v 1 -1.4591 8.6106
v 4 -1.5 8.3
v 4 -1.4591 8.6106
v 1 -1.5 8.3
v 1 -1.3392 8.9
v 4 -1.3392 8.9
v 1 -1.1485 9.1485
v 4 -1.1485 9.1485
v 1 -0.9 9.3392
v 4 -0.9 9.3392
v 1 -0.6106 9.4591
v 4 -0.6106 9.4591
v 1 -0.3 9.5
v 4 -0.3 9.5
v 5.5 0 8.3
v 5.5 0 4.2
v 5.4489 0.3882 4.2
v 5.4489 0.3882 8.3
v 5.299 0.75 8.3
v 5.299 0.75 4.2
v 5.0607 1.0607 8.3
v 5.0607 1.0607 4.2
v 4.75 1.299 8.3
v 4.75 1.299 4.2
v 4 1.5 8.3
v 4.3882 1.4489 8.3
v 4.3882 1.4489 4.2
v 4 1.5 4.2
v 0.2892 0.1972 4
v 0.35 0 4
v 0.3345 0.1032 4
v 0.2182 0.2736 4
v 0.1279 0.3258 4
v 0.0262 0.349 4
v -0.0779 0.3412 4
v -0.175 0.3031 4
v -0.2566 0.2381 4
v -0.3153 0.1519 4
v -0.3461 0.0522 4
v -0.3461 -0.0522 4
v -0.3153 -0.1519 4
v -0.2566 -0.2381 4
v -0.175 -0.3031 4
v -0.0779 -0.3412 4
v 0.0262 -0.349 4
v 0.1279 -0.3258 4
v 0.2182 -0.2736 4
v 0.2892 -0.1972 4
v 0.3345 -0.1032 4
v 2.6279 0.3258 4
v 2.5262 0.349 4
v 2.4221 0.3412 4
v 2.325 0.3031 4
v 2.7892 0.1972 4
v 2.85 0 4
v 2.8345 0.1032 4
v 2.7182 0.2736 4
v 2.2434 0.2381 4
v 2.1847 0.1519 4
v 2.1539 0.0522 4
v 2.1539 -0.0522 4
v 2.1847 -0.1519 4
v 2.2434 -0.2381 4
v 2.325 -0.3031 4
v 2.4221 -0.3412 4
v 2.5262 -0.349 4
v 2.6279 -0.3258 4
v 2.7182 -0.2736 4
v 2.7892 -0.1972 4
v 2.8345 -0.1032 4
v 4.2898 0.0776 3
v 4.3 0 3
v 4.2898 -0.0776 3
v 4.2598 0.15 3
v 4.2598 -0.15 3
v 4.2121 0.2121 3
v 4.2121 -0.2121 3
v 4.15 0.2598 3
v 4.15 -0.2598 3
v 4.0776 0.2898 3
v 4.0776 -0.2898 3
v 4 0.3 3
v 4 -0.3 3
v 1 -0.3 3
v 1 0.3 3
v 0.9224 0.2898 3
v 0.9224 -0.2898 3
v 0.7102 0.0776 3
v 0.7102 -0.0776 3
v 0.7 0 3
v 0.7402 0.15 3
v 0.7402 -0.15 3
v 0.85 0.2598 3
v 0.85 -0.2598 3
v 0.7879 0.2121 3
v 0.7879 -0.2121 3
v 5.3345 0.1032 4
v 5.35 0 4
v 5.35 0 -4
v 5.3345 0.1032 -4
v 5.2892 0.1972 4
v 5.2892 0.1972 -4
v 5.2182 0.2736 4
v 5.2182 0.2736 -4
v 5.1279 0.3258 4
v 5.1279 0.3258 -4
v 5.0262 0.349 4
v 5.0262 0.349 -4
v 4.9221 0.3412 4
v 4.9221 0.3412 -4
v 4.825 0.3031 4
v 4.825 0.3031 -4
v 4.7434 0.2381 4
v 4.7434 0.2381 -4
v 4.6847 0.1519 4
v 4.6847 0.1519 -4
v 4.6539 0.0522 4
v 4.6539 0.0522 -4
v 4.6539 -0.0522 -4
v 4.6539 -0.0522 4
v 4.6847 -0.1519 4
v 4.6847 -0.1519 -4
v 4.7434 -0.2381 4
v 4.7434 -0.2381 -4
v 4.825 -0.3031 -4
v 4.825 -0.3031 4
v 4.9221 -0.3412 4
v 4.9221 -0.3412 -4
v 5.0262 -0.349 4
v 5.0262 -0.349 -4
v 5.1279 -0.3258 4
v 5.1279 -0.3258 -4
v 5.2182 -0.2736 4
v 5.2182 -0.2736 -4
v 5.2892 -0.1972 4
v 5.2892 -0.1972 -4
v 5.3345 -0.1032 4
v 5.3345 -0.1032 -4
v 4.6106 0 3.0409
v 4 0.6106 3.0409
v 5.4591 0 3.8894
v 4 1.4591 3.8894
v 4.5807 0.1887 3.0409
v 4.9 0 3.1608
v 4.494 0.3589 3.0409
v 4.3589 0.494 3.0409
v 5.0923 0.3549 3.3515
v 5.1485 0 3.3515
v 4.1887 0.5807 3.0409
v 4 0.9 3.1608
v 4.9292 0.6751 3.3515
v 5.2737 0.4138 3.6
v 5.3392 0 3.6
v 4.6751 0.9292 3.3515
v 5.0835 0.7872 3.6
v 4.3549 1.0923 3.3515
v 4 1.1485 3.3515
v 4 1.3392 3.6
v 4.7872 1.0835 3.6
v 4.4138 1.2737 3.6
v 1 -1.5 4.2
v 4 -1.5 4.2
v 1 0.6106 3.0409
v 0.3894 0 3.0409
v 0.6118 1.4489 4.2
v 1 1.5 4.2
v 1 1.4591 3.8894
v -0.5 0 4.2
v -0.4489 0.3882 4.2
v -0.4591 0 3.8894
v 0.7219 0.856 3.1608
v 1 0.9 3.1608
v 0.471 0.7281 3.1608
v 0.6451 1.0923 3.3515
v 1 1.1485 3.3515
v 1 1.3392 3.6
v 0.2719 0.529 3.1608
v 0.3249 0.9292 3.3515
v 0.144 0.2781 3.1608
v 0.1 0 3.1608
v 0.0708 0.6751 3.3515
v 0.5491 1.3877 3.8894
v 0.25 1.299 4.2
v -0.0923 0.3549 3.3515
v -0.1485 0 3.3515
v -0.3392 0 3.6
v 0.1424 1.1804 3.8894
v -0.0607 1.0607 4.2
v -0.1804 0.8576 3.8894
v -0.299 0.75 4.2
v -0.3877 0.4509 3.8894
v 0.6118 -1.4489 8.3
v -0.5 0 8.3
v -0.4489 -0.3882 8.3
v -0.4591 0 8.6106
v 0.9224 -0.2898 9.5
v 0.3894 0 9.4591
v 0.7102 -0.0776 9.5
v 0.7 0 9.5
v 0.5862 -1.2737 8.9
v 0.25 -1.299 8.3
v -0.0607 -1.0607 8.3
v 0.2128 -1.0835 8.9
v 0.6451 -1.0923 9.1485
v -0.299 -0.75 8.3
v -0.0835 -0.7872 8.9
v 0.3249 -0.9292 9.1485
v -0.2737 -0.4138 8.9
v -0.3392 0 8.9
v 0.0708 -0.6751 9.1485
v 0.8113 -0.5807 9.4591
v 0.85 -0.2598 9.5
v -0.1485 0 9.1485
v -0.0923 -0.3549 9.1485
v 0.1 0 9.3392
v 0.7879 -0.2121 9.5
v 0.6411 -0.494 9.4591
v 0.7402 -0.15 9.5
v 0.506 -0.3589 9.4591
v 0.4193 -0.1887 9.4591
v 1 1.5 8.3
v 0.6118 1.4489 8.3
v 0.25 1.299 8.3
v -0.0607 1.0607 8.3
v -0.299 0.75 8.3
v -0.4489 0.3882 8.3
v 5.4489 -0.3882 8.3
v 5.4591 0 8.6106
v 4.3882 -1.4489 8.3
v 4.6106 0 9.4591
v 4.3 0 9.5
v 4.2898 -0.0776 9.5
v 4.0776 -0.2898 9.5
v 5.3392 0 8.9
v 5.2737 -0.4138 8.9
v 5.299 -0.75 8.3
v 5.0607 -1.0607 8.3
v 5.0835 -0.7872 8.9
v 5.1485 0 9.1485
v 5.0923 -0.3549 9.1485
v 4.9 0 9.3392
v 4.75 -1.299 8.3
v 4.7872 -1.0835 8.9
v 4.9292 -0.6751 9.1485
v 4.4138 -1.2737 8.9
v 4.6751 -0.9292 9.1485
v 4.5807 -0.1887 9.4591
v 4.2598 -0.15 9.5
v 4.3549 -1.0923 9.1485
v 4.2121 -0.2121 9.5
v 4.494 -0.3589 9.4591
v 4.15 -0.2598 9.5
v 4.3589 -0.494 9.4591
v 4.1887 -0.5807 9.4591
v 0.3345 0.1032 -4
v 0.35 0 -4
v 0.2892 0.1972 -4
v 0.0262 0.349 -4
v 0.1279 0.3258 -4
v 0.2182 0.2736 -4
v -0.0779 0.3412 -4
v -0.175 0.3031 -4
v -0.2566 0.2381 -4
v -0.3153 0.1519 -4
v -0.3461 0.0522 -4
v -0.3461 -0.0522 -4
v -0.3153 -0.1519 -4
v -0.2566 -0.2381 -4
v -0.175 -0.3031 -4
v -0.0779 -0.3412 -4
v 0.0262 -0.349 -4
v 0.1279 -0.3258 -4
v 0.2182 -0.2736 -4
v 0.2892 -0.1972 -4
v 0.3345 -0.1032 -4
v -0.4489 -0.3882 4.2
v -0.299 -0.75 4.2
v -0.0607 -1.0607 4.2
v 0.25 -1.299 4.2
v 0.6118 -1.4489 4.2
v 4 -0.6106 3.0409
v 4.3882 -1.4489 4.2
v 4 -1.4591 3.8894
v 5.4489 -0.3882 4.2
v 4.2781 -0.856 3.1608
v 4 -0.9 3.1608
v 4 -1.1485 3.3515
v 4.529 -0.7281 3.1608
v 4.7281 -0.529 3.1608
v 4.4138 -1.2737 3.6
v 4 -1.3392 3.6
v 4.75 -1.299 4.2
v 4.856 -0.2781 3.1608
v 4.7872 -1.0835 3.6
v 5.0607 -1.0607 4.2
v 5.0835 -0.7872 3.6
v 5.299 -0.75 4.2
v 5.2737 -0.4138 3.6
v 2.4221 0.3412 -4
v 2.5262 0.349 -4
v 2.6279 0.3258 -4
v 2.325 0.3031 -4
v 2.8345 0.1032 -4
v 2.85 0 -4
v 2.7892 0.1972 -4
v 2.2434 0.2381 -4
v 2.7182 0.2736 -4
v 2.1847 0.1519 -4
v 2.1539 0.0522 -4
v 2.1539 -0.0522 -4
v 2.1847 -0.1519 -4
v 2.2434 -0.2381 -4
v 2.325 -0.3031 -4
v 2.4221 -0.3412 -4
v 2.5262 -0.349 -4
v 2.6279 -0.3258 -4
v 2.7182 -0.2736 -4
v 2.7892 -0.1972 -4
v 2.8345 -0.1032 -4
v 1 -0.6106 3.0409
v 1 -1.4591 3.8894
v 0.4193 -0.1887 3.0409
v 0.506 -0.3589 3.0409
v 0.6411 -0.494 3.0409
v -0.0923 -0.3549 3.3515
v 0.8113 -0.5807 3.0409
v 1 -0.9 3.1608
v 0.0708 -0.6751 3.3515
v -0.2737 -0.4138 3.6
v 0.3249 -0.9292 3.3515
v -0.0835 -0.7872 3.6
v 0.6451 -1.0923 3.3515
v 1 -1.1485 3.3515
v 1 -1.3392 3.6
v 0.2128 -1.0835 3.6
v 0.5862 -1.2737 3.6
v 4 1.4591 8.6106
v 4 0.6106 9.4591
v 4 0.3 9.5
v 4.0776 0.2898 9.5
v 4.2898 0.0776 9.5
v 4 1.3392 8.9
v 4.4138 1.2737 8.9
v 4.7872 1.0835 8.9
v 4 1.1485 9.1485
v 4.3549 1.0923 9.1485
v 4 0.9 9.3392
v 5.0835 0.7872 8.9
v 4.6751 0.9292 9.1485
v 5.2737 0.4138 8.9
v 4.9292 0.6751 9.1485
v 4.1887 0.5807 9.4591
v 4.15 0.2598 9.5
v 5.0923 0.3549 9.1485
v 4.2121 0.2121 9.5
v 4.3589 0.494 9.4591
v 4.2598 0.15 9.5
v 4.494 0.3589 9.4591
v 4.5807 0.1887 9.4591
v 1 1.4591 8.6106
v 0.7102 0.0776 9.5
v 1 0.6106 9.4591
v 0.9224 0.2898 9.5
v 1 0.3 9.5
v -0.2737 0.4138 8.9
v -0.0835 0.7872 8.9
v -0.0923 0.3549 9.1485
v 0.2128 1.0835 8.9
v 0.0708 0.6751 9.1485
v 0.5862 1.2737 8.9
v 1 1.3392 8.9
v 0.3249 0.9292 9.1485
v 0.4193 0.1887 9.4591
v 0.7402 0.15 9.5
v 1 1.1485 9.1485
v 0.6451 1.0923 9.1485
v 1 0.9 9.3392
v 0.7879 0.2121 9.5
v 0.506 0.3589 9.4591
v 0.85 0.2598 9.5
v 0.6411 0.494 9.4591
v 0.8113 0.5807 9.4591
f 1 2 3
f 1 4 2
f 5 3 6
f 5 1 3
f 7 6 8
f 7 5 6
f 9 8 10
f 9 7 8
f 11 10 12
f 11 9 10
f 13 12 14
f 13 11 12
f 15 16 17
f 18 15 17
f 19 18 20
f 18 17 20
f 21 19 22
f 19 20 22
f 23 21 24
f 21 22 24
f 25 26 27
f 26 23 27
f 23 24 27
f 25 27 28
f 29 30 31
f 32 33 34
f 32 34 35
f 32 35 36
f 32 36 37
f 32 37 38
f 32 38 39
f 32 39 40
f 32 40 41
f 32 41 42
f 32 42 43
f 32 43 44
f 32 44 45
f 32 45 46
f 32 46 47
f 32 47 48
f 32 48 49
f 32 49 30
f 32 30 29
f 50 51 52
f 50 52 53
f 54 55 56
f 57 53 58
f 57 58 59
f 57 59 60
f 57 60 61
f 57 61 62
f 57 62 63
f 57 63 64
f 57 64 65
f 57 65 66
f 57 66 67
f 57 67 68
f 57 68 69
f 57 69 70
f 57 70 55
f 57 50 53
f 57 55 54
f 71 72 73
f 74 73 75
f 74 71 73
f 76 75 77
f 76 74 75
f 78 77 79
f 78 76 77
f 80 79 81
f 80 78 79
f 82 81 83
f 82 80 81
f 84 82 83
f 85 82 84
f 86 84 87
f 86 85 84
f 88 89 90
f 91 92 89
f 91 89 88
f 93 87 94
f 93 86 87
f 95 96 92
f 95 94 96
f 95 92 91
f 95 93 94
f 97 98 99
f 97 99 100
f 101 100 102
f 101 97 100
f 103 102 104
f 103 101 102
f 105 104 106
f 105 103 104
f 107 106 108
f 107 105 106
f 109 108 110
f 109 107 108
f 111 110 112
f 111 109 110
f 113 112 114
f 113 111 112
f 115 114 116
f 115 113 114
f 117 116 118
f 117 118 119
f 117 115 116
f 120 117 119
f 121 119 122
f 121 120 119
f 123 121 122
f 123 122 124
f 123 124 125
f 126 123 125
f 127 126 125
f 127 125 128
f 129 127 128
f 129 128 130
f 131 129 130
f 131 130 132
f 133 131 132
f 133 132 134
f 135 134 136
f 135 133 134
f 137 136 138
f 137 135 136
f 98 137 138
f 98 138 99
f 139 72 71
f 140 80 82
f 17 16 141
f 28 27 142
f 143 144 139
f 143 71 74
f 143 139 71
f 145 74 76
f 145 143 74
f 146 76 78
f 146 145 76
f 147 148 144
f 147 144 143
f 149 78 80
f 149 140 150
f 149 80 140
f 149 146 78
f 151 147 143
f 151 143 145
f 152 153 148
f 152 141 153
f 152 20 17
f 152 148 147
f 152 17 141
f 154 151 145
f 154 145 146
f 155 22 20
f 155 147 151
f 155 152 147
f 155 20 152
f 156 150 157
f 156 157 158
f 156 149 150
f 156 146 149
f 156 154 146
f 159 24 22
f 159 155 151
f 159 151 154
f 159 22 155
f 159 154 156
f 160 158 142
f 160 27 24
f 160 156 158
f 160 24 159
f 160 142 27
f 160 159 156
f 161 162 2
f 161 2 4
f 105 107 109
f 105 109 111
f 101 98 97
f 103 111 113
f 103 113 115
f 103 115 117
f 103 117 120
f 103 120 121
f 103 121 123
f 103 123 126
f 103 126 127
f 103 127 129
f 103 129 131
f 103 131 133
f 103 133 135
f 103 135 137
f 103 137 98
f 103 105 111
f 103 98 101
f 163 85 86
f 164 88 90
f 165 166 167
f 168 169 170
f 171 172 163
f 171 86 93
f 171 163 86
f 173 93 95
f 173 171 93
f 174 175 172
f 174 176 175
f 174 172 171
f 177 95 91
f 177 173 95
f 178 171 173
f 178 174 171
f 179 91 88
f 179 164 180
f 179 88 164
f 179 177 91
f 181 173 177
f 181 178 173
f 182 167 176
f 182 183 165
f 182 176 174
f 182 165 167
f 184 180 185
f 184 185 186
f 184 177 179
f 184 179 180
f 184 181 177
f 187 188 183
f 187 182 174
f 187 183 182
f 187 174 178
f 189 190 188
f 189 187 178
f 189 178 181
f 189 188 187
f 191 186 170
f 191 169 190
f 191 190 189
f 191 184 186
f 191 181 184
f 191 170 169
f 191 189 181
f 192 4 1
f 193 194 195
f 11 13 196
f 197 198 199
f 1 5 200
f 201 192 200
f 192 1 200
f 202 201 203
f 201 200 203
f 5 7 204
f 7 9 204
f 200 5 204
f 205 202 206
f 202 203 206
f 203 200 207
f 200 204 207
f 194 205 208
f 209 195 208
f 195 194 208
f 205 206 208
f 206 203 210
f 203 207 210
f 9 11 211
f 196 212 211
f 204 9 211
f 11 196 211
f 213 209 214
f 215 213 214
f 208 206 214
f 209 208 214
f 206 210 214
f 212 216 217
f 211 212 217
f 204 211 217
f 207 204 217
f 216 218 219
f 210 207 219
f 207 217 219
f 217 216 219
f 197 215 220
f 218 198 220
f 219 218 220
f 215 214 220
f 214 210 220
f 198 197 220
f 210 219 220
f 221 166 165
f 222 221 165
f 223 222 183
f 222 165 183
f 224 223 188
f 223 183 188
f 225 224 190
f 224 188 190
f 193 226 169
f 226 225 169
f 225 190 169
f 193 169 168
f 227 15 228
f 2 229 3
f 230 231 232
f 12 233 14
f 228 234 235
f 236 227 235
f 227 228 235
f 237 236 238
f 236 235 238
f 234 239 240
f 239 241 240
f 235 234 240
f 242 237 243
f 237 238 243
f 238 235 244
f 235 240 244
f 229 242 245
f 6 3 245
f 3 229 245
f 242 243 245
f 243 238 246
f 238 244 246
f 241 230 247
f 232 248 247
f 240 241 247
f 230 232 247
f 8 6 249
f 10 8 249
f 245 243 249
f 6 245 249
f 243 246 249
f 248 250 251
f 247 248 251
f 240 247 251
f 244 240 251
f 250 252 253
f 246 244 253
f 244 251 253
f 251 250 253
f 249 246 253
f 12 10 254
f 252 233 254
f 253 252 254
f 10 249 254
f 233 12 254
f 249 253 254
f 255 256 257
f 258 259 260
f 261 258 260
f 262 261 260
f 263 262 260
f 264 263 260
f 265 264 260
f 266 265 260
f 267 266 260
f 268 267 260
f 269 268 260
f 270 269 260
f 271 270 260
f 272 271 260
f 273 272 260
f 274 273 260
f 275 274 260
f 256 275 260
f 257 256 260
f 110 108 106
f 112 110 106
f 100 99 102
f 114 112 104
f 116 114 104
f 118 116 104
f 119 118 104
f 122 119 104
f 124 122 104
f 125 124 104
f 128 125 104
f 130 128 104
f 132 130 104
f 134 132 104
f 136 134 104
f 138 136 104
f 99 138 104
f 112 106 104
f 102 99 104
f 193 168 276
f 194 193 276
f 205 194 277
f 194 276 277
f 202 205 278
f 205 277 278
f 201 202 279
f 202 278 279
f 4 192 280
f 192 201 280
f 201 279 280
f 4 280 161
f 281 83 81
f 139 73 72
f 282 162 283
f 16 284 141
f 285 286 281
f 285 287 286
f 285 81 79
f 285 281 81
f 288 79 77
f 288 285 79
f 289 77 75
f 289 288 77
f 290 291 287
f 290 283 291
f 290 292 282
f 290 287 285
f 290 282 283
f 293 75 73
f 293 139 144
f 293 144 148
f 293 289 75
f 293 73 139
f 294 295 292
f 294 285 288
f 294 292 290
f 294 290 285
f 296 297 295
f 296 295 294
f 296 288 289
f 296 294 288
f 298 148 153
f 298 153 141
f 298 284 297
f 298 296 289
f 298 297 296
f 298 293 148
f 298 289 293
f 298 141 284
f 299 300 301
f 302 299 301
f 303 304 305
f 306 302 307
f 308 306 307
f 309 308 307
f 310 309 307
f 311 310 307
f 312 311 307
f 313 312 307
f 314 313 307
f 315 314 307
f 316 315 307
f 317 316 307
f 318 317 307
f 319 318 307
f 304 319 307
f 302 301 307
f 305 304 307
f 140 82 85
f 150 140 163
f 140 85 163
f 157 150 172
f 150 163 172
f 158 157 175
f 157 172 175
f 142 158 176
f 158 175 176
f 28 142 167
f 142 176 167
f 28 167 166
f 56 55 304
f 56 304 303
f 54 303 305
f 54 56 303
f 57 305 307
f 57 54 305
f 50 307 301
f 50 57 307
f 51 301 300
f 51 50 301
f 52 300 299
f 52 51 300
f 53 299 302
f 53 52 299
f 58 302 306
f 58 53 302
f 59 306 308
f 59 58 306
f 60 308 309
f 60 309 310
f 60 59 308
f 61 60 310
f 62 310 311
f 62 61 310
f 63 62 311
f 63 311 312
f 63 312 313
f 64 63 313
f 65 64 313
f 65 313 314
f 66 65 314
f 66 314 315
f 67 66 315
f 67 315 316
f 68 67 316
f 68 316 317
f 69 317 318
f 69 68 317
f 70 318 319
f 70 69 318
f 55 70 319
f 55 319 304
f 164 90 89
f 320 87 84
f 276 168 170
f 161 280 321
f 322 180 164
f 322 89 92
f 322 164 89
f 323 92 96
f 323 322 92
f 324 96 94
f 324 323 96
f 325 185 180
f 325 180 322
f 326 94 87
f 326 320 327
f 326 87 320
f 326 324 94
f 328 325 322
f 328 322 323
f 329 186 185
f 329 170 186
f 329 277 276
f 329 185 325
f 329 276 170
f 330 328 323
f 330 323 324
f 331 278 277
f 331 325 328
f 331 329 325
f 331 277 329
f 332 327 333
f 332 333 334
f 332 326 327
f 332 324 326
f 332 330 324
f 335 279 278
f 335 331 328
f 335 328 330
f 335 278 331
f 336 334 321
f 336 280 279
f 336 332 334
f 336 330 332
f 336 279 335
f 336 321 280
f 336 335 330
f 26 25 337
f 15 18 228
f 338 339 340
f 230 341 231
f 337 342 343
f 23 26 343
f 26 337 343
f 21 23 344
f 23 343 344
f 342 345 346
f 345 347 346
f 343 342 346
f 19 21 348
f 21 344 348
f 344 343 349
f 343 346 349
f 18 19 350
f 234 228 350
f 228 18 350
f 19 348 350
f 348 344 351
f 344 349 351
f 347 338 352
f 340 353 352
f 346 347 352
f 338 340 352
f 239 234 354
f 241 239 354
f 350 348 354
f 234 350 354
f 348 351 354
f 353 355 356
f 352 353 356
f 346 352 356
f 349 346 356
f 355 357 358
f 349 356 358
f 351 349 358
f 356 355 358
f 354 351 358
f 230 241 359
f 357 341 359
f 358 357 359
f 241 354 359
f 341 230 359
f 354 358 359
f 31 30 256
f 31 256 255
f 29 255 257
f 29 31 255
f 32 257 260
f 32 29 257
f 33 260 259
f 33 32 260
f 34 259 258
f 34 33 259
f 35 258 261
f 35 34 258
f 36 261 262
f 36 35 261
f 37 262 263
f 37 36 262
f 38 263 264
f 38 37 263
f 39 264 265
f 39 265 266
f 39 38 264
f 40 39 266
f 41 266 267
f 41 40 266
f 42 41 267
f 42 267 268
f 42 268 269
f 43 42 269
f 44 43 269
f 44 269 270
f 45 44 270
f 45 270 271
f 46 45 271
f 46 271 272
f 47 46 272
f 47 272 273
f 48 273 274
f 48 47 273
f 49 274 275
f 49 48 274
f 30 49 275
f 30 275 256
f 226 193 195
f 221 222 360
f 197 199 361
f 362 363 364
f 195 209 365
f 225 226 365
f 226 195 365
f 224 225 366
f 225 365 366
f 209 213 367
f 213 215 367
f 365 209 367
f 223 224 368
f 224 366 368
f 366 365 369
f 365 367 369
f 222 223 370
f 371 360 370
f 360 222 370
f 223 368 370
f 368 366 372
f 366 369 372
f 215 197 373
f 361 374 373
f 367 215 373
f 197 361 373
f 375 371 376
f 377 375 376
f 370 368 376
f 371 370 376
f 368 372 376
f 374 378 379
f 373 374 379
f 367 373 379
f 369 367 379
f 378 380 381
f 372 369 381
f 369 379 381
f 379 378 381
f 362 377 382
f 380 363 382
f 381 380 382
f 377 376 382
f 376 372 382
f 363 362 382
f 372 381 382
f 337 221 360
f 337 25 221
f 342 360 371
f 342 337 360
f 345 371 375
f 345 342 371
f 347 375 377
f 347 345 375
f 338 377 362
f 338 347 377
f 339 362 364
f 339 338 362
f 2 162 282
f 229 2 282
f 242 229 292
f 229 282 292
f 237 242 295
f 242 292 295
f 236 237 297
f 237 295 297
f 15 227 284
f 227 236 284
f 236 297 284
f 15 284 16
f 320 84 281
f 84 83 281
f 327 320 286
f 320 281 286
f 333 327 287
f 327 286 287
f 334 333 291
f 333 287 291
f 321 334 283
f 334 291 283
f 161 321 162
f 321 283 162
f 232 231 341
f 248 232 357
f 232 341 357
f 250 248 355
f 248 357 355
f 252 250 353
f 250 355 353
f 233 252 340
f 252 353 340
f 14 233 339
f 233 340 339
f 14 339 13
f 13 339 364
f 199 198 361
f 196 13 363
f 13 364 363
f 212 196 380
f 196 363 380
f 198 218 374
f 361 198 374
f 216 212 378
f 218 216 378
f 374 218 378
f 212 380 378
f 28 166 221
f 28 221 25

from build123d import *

# Parameters (mm, degrees)
SKETCH_R     = 0.35
PAD_DEPTH    = 8
PAD002_DEPTH = 6.5
FILLET_R     = 1.2
FILLET001_R  = 1.2


with BuildPart() as pad:
    # Sketch → Pad (new body)
    with BuildSketch(Plane.XY.offset(4)):
        Circle(SKETCH_R)
        with Locations((5, 0)):
            Circle(SKETCH_R)
        with Locations((2.5, 0)):
            Circle(SKETCH_R)
    extrude(amount=-PAD_DEPTH)


with BuildPart() as fillet001:
    # Sketch003 → Pad002 (new body)
    with BuildSketch(Plane.XY.offset(3)):
        with BuildLine():
            Line((1, 1.5), (4, 1.5))
            ThreePointArc((5.5, 0), (5.06066, 1.06066), (4, 1.5))
            ThreePointArc((4, -1.5), (5.06066, -1.06066), (5.5, 0))
            Line((4, -1.5), (1, -1.5))
            ThreePointArc((-0.5, 0), (-0.06066, -1.06066), (1, -1.5))
            ThreePointArc((1, 1.5), (-0.06066, 1.06066), (-0.5, 0))
        make_face()
    extrude(amount=PAD002_DEPTH)

    # Fillet
    fillet_edges = [fillet001.edges().sort_by_distance(p)[0] for p in [
        (2.5, 1.5, 9.5),
        (-0.06066, 1.06066, 9.5),
        (-0.06066, -1.06066, 9.5),
        (2.5, -1.5, 9.5),
        (5.06066, -1.06066, 9.5),
        (5.06066, 1.06066, 9.5),
    ]]
    fillet(fillet_edges, radius=FILLET_R)

    # Fillet001
    fillet001_edges = [fillet001.edges().sort_by_distance(p)[0] for p in [
        (5.06066, -1.06066, 3),
        (5.06066, 1.06066, 3),
        (2.5, 1.5, 3),
        (2.5, -1.5, 3),
        (-0.06066, -1.06066, 3),
        (-0.06066, 1.06066, 3),
    ]]
    fillet(fillet001_edges, radius=FILLET001_R)


solid = Compound([pad.part, fillet001.part])
